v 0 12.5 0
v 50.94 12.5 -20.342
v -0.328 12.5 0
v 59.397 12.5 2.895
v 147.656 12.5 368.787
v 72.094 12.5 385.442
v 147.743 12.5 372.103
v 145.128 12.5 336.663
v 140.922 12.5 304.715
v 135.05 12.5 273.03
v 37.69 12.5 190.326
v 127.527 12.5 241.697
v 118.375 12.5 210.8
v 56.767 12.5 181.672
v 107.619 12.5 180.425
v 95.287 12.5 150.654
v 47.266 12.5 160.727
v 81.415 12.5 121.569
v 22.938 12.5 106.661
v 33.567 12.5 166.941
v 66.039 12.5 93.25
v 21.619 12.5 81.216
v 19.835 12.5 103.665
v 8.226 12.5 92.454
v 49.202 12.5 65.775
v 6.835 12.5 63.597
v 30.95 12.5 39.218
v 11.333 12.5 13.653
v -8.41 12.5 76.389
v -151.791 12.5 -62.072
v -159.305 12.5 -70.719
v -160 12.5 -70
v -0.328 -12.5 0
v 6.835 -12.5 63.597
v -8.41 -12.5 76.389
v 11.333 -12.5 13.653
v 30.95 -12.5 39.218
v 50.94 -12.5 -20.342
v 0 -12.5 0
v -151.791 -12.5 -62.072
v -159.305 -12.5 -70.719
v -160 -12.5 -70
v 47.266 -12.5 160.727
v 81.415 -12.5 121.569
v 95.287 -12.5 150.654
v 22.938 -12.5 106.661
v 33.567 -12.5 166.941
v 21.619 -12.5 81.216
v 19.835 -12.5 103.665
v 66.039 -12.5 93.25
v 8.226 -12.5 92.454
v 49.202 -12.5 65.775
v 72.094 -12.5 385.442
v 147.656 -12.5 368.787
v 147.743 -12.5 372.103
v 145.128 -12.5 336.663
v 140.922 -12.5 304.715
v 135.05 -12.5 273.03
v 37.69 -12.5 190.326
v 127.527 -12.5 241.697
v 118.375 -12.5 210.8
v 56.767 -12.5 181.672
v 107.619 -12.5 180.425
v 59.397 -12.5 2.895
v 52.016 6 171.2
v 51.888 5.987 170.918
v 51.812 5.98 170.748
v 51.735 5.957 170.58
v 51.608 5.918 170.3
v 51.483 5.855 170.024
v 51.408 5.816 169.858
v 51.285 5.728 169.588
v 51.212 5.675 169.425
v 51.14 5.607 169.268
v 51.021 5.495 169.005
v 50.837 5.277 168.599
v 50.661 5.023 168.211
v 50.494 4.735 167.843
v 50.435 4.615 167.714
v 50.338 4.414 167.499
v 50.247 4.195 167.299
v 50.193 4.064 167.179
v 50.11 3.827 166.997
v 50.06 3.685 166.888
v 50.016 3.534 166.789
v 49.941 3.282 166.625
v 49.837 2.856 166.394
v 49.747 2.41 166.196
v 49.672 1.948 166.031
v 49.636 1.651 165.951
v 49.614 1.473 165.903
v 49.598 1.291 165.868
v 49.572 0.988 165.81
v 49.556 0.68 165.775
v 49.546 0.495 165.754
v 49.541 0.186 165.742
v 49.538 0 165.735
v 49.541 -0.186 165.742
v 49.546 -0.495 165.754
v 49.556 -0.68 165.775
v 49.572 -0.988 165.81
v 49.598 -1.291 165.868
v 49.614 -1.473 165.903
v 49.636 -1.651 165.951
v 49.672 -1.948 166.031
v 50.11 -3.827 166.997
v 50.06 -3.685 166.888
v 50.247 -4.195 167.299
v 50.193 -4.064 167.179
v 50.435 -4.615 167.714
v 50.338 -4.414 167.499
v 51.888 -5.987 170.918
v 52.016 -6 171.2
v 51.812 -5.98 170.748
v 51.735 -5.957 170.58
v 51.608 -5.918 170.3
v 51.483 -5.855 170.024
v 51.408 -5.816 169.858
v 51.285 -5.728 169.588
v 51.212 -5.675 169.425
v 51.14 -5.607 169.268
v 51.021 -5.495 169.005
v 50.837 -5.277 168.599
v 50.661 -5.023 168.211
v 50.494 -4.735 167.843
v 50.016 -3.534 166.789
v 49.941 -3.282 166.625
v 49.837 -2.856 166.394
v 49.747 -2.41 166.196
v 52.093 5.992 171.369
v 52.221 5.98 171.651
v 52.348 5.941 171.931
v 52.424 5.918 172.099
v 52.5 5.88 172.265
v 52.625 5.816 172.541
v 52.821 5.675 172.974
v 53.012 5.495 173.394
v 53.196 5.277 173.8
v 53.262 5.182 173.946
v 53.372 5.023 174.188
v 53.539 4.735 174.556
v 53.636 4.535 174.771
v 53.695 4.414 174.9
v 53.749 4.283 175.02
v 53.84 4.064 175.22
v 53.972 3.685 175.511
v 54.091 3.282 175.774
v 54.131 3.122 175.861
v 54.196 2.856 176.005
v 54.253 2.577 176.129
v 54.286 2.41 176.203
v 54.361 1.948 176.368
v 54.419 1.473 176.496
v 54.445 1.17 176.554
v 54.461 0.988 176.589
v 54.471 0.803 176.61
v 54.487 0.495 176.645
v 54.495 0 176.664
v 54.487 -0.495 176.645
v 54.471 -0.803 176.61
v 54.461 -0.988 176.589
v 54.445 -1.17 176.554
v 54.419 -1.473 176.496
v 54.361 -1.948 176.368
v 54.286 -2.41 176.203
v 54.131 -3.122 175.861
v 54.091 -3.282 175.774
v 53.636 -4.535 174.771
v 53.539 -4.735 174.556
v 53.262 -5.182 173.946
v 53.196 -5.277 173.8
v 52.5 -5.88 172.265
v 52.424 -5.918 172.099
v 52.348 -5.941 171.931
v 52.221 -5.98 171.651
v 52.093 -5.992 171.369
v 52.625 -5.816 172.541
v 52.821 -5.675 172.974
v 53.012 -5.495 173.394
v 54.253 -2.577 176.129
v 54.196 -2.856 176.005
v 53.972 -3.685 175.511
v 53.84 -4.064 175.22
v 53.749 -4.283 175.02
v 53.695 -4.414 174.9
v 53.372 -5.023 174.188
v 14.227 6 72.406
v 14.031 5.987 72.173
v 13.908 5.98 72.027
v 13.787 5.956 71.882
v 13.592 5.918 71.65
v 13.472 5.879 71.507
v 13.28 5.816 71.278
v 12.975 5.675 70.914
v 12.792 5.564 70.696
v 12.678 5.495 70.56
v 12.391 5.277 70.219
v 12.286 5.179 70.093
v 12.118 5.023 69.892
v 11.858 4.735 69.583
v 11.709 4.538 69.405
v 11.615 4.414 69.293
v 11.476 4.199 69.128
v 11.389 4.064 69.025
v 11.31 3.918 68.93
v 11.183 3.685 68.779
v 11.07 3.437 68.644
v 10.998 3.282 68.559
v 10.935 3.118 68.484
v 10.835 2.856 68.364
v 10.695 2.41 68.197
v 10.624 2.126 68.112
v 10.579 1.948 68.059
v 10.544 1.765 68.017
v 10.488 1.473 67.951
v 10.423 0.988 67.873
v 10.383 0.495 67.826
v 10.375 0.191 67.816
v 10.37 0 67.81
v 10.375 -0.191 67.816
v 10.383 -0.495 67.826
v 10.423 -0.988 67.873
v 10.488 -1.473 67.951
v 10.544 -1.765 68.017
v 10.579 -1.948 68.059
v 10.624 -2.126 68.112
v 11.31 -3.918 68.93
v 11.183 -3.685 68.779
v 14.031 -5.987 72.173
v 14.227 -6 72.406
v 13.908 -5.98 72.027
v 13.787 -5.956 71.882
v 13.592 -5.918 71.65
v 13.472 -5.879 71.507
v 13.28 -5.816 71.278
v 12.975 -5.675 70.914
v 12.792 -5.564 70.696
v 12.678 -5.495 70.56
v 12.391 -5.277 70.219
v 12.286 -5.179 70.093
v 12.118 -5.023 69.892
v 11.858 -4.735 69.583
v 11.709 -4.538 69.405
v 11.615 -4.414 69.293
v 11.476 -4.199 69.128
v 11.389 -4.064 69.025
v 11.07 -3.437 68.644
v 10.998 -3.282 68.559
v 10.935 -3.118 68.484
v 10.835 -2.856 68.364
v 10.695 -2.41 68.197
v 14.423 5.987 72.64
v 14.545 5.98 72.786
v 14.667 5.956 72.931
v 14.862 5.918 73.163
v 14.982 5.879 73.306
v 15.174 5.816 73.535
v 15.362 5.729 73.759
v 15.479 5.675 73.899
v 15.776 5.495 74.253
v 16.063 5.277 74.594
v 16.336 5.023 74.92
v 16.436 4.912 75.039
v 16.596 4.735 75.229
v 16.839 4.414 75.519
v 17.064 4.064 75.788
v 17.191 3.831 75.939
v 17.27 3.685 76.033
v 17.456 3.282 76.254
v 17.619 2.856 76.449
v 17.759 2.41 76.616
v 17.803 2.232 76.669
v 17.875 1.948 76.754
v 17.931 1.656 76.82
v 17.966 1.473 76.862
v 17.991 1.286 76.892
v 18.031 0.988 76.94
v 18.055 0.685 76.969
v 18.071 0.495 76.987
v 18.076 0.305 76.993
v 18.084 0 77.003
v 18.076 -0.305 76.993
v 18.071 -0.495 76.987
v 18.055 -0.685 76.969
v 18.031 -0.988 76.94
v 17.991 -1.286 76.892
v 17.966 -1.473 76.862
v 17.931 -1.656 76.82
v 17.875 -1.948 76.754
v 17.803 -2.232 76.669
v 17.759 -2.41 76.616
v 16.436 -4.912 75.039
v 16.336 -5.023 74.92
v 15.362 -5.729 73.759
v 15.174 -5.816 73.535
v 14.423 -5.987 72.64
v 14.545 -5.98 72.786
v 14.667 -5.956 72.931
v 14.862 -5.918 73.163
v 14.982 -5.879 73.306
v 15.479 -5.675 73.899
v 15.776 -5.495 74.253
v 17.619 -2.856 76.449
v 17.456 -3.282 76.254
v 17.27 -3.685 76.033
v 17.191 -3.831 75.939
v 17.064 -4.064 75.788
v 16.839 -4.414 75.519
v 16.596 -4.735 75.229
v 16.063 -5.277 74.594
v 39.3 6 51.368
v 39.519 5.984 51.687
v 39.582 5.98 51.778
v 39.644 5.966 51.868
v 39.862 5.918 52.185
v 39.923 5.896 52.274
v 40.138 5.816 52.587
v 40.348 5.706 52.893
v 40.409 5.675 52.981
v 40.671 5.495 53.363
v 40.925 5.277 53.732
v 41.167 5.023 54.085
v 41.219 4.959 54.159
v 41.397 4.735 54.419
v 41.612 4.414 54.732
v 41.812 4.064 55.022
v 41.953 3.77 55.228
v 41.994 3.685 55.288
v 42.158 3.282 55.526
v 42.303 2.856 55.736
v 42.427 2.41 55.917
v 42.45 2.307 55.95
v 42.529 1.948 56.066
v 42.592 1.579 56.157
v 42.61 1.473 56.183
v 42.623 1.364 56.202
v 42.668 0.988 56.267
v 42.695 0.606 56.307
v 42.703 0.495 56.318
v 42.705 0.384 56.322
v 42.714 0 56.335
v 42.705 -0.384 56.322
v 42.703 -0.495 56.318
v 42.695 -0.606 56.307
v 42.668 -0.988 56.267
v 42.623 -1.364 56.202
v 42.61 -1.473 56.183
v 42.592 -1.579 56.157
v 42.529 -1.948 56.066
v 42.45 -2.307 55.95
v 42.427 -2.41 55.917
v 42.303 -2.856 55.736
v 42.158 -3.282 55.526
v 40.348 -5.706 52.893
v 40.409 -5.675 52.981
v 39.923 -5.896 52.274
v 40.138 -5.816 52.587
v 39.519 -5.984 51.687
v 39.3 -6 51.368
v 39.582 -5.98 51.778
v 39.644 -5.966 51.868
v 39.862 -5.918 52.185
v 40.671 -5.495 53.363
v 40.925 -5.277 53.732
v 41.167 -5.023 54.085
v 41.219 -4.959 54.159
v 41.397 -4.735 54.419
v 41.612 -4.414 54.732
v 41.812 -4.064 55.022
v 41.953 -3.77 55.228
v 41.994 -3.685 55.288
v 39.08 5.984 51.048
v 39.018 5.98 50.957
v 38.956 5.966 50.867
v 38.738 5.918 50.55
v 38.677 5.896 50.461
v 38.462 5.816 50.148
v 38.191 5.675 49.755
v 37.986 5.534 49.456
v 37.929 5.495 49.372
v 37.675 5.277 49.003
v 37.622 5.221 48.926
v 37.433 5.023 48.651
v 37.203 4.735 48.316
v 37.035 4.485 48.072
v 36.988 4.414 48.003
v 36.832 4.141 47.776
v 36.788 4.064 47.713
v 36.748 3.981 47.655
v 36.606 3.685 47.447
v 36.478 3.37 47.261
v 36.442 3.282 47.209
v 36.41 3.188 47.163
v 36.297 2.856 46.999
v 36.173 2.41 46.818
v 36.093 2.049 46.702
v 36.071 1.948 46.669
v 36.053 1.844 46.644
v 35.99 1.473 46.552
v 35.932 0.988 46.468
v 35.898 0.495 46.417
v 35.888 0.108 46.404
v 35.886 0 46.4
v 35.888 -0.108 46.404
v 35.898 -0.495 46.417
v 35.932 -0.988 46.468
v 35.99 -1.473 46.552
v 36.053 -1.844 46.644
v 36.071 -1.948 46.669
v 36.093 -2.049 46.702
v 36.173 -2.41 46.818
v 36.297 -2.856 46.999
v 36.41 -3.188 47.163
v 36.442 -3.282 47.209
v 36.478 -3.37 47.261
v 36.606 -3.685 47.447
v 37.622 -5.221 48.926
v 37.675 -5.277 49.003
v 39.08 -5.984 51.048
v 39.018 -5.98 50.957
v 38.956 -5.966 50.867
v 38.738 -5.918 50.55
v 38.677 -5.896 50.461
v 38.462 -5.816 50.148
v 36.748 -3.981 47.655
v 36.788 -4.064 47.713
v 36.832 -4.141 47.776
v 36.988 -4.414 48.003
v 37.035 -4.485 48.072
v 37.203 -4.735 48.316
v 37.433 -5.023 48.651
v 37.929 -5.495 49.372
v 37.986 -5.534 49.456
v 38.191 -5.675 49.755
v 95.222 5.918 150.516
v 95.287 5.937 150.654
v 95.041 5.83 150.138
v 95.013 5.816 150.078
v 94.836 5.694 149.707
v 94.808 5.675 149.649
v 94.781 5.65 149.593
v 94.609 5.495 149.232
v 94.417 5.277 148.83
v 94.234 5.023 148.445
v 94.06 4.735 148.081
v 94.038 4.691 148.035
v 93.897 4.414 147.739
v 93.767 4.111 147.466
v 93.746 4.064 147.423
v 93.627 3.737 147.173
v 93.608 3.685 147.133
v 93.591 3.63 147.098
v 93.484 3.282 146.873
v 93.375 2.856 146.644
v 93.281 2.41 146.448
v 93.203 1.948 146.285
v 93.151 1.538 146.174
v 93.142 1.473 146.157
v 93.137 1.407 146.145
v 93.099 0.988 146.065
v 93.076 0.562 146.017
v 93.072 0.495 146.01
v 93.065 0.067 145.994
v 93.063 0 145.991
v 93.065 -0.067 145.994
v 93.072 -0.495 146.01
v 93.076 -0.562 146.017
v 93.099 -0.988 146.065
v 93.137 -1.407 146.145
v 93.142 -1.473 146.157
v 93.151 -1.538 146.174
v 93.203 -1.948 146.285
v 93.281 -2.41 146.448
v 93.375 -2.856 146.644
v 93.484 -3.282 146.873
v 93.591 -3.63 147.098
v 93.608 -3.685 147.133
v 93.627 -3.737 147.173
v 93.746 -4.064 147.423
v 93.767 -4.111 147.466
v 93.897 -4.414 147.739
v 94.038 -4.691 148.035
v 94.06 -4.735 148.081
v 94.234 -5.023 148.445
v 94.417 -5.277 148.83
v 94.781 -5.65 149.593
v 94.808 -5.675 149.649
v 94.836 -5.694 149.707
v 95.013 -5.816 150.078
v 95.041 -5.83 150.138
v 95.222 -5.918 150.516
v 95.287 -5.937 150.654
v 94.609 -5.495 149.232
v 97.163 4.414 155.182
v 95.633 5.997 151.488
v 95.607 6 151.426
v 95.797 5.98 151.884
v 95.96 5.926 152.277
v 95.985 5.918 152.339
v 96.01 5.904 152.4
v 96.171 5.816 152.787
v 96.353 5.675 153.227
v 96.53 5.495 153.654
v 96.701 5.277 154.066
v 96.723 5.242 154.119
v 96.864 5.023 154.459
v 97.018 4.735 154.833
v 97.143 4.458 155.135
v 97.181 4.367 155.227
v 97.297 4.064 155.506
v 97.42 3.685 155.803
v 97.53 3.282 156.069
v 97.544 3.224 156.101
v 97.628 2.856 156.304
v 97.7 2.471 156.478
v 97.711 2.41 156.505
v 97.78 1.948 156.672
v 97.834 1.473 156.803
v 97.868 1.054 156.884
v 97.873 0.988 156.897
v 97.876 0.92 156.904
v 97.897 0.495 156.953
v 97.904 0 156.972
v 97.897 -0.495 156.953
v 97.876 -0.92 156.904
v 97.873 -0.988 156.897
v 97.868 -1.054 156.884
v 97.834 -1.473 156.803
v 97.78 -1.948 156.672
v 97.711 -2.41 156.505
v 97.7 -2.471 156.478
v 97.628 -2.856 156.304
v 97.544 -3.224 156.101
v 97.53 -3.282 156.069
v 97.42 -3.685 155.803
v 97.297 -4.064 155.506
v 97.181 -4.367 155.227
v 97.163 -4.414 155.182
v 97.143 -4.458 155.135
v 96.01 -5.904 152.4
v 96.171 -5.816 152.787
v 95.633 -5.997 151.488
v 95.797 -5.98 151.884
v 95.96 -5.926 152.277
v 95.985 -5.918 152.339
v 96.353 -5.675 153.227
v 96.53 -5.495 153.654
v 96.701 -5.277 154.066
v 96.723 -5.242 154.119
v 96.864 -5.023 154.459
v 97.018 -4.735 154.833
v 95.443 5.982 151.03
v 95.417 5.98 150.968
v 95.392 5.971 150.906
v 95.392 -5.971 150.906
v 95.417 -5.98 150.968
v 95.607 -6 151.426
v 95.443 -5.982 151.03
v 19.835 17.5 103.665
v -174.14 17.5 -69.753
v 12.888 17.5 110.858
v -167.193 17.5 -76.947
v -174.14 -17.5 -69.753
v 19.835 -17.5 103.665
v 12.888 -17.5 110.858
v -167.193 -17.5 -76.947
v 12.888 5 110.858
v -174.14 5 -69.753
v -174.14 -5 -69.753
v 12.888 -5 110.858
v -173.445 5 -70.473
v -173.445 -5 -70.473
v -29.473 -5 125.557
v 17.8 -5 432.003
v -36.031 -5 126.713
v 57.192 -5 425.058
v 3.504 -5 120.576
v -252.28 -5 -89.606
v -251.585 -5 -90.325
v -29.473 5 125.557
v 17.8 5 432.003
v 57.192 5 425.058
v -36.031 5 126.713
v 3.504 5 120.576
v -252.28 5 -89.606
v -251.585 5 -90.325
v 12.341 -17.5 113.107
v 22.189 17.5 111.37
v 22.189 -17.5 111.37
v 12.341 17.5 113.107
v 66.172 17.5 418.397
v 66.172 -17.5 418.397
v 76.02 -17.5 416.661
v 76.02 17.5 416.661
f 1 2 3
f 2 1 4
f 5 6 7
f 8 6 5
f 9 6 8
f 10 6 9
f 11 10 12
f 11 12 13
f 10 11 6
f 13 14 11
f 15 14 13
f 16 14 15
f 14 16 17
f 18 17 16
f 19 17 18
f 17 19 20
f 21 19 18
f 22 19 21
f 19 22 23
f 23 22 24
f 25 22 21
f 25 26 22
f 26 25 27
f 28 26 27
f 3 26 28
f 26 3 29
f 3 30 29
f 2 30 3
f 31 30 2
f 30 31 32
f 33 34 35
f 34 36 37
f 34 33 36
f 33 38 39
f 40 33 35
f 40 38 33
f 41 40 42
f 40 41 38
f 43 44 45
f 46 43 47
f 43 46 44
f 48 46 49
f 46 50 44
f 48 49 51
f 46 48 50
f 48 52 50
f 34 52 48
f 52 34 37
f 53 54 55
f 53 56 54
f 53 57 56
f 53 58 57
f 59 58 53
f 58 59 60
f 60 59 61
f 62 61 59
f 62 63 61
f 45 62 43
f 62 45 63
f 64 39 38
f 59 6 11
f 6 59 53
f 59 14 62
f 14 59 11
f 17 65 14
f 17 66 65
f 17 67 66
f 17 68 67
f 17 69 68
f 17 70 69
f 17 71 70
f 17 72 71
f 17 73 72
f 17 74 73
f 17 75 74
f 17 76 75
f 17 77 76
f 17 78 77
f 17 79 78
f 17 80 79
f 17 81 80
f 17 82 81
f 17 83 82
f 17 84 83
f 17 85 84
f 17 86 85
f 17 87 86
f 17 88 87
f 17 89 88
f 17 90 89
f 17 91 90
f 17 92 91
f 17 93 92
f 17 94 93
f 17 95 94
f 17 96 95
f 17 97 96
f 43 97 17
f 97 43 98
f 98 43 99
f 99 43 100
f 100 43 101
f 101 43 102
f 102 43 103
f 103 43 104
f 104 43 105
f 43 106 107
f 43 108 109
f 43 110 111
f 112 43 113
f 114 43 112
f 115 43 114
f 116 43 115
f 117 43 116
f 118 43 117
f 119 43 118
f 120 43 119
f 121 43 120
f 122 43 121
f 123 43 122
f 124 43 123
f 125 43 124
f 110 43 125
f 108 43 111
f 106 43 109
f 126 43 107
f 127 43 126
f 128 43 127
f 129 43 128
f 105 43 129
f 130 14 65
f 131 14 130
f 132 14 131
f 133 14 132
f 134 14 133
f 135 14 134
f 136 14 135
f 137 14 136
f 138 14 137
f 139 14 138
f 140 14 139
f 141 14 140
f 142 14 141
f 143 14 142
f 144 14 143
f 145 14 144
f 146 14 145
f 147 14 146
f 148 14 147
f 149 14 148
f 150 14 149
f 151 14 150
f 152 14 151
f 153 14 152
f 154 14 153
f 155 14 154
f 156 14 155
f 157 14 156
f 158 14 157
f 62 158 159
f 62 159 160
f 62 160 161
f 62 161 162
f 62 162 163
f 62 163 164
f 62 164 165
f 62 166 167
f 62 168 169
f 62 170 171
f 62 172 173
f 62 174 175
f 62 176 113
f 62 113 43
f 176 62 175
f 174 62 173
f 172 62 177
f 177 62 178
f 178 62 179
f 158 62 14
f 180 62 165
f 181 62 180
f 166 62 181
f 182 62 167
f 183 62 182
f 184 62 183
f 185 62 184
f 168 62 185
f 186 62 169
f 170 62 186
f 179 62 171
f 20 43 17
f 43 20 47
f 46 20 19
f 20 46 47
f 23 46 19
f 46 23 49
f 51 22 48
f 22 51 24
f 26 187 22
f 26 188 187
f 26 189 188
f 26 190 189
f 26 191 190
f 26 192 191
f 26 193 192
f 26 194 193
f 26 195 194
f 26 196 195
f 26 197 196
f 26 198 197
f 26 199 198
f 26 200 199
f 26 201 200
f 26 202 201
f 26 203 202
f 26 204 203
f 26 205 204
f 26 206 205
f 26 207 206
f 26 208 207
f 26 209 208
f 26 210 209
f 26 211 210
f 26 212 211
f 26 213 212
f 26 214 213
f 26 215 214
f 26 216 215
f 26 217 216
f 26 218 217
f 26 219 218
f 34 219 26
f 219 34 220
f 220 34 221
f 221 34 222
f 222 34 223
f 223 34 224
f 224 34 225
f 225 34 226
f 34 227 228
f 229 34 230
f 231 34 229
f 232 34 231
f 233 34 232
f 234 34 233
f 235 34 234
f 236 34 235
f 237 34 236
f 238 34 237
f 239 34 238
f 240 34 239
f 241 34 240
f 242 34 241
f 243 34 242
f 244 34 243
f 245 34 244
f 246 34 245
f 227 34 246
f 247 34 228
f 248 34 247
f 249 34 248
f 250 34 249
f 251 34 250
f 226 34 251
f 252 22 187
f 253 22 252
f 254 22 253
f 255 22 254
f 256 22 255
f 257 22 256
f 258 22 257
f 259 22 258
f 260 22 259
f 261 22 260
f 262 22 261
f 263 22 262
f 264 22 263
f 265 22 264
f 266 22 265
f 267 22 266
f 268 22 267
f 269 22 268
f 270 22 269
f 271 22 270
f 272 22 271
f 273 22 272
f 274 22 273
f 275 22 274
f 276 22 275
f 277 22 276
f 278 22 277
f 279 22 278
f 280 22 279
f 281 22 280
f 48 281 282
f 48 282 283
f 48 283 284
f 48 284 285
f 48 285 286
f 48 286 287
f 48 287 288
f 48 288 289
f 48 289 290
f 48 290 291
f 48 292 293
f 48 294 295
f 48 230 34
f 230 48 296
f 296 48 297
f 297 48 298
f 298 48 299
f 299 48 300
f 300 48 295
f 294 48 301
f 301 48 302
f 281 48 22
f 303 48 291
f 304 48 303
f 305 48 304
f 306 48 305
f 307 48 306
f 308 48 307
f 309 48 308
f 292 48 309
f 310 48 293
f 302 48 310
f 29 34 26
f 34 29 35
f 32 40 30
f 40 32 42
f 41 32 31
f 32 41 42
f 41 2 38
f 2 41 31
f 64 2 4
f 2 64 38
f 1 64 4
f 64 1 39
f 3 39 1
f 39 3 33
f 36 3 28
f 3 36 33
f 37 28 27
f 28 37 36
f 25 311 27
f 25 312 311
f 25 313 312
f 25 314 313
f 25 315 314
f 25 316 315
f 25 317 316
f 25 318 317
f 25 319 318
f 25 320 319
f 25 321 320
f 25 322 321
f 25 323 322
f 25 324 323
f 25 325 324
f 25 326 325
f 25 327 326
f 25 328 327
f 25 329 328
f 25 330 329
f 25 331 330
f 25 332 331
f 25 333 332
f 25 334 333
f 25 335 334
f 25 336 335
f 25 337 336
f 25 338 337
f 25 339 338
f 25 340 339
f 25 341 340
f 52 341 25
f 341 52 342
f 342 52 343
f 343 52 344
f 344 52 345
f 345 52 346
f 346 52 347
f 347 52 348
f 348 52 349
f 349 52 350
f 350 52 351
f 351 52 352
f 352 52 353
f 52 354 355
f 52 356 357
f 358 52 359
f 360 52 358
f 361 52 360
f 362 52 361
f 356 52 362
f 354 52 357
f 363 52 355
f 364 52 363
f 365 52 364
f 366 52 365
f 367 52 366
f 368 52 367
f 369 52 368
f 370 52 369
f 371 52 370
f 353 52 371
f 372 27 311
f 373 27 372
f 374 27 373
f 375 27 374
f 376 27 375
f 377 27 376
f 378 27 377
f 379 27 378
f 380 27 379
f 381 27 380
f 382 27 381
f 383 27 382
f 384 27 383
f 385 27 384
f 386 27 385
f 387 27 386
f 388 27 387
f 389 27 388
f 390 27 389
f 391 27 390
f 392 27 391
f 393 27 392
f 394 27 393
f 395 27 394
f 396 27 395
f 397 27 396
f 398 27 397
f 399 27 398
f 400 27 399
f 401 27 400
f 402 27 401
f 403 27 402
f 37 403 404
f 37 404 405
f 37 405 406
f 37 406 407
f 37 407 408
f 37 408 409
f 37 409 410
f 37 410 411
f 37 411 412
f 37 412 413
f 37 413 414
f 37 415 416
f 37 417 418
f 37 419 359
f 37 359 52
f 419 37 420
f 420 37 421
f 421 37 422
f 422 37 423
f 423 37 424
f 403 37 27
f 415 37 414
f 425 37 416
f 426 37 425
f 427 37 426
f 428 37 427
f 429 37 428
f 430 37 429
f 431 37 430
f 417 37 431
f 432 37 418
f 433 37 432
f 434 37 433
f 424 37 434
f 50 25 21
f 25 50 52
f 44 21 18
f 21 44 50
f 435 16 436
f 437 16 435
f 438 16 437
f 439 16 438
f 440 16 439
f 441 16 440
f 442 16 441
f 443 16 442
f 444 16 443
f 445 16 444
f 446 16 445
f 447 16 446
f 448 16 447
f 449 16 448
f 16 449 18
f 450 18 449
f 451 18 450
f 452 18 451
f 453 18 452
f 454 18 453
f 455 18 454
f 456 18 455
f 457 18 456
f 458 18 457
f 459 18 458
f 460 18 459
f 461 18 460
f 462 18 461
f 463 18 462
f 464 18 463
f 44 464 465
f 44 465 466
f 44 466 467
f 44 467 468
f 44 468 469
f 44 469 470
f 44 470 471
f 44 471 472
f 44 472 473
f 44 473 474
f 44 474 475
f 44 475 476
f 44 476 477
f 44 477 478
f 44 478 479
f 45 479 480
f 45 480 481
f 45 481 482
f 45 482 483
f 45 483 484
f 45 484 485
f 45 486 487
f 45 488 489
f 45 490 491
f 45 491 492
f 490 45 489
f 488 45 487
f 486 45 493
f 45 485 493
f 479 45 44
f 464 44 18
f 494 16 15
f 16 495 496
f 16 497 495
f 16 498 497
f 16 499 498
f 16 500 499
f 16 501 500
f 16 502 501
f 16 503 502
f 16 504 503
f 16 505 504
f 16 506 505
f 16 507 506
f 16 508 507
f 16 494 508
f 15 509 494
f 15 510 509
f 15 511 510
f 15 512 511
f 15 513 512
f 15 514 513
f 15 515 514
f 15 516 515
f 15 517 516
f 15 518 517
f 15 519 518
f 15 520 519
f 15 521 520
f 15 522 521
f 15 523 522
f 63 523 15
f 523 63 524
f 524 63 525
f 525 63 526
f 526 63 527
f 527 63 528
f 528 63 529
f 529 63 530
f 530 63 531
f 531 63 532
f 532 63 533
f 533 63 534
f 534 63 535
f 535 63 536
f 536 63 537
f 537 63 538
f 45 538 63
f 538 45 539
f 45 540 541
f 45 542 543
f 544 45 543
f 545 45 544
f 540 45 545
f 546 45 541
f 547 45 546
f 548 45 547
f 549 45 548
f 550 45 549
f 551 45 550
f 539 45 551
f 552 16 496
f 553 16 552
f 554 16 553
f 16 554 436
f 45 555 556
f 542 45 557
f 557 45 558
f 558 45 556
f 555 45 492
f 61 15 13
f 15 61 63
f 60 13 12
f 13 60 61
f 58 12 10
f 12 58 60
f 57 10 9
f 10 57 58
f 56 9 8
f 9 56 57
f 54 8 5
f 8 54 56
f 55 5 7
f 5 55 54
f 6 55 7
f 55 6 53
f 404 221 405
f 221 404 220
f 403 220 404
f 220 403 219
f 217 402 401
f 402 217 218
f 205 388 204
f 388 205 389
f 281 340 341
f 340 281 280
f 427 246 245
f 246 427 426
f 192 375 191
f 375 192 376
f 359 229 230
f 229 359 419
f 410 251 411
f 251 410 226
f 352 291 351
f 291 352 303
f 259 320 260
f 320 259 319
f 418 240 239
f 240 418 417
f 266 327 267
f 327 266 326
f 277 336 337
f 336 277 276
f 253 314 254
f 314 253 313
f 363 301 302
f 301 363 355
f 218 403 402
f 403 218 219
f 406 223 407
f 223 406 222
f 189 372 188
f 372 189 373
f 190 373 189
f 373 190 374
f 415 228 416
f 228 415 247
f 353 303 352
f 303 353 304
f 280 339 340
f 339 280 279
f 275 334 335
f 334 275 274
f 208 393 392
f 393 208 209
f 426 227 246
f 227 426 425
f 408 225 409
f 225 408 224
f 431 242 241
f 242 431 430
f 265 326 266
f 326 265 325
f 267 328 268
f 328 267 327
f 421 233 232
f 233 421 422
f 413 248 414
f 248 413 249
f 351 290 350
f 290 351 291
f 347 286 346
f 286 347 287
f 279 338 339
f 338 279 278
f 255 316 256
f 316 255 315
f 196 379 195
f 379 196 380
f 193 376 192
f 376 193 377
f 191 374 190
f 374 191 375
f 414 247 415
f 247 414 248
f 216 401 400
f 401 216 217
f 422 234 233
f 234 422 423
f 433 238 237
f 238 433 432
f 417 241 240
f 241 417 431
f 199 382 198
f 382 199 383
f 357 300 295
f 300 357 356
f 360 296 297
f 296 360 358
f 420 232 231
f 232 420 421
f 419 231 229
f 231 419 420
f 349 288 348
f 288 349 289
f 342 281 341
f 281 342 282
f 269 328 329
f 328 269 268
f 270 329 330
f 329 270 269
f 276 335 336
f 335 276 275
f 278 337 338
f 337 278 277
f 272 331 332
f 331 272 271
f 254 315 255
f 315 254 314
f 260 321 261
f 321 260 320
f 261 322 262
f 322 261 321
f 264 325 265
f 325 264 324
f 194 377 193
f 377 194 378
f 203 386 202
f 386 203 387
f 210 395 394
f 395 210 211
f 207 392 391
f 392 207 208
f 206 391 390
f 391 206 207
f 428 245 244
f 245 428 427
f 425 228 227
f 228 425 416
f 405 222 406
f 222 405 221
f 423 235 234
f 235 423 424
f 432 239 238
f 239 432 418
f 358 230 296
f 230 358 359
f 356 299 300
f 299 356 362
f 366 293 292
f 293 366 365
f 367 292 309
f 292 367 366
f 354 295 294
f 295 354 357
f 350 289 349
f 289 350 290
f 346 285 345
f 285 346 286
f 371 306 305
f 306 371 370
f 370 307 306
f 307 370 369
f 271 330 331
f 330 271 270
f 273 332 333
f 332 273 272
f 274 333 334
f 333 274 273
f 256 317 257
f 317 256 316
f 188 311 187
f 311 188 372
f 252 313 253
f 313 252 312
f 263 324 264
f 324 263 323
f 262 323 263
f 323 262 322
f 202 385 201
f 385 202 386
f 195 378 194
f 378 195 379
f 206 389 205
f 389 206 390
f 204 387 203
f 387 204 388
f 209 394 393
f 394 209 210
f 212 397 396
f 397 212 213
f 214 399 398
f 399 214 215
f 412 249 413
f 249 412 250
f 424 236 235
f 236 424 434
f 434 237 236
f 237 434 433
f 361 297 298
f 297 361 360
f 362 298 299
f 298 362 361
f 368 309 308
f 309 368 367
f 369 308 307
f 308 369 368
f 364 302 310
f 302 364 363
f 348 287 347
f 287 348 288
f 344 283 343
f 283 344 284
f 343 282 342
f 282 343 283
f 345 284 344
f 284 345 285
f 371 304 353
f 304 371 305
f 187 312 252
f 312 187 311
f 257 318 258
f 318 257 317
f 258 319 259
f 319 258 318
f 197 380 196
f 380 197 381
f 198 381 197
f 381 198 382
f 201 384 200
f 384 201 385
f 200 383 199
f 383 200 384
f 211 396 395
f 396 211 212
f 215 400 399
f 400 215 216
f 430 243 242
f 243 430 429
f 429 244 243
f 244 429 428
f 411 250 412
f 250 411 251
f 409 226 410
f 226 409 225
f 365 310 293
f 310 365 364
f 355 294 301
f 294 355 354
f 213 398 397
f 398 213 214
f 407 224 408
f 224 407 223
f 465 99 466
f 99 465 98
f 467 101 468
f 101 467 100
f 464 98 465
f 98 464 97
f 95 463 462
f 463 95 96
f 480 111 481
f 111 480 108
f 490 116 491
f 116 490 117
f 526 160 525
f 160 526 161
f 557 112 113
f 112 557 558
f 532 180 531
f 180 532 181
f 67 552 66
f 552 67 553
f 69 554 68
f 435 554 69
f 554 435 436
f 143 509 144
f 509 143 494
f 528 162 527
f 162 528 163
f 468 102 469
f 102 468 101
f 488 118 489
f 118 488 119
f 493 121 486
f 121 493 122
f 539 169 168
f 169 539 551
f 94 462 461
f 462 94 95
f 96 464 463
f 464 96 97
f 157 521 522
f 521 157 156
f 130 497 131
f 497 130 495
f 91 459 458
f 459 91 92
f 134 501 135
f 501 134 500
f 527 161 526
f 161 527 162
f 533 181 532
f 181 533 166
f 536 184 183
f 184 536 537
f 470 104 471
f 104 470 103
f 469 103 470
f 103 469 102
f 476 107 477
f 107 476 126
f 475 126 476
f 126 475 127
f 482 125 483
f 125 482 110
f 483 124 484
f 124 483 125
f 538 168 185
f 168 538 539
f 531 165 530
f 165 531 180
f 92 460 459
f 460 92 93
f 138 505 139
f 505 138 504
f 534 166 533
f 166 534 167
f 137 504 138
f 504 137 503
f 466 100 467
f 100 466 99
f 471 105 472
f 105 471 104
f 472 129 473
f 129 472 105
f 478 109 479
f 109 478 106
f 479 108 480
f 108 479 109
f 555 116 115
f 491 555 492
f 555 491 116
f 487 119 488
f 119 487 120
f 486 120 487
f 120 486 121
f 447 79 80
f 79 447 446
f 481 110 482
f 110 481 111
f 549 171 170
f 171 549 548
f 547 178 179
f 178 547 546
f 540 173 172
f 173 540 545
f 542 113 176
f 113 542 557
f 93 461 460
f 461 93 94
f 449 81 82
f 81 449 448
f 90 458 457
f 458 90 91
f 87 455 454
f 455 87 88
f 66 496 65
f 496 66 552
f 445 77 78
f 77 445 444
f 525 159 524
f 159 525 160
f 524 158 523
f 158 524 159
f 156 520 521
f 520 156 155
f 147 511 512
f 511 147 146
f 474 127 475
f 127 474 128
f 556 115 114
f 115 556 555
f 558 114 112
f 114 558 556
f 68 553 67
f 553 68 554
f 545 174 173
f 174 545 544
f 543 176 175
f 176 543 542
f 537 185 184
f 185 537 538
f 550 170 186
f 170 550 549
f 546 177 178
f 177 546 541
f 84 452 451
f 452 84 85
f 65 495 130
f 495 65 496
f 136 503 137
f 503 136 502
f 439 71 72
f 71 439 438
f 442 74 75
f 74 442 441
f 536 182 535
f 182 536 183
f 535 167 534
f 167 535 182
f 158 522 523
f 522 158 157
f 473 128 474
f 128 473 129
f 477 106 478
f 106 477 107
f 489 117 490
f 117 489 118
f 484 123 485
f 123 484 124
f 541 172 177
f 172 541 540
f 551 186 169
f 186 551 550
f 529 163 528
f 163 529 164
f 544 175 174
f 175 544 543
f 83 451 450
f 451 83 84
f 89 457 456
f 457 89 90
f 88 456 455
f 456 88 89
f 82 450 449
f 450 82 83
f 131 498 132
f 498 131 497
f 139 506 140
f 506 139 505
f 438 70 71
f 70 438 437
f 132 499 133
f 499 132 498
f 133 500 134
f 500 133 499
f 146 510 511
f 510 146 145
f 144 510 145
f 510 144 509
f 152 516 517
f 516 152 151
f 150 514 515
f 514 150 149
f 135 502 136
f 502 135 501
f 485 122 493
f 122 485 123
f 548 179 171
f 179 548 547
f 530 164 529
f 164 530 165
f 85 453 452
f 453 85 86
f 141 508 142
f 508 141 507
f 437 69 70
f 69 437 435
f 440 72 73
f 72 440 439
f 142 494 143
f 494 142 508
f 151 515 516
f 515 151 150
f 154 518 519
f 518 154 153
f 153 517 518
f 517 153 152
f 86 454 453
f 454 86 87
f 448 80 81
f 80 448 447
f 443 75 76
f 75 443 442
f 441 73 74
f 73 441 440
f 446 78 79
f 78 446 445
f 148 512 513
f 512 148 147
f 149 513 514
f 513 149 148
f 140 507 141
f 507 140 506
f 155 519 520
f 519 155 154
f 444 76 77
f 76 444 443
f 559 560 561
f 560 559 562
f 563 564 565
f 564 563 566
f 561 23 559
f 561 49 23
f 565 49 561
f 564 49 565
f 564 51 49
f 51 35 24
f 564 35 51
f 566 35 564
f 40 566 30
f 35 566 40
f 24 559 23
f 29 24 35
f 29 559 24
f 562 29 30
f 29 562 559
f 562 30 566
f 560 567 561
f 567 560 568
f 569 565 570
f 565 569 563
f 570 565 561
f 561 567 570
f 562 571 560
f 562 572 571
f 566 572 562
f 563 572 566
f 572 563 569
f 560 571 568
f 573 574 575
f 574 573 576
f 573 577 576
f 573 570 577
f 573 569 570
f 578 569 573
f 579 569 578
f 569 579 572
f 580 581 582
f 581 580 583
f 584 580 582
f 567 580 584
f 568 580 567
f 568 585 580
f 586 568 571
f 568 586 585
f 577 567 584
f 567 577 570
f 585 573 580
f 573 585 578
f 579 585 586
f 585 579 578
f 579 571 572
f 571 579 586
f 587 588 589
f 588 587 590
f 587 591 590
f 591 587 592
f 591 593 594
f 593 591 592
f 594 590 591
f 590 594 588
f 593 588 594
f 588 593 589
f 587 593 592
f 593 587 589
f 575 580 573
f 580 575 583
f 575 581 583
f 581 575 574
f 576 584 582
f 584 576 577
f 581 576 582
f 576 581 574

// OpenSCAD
use <libs/threads.scad>
$fs=$fs/4;
$fa=$fa/4;

pointe_l = 264;

module flexi_pointe(){
    hull(){
        rotate([0,44,0])cylinder(r=1, 264);
        translate([100,-15,20]) rotate([0,44,0])cube([5, 30, 200]);
        
        
    }
}


module flexi_pointe_sup(){
    translate([230,0,450])hull(){
        rotate([0,44+146,0])cylinder(r=1, 264);
        translate([65,-15,20]) rotate([0,44+146,0])cube([5, 30, 310]);
        
        
    }
}

module flexi_ailette(){
   translate([255,20,63]) rotate([2,-16,0]) hull(){
        cube([100,1,10]);
        translate([130, 130]) cube([100,1,10]);
        
        
        
    }
}

module dent2d(){
    polygon([[0,0.3], [10,-07], [20,-15], [30,-24], [40,-32]
                , [50,-40], [60,-49], [70,-55], [80,-62], [90,-69]
                , [100,-76], [120,-89], [140,-99], [160,-108], [180,-116]
                , [200,-125], [240,-139], [280,-150], [320,-158], [360,-164]
                , [400,-166], [440,-166], [480,-165], [520,-164],
                , [520,-220], [480,-221], [440,-222], [400,-223],
                , [360,-222], [320,-217], [280,-212], [240,-201],
                , [200,-187], [180,-180], [160,-173], [140,-165], [120,-156]
                , [100,-146], [90,-141],[80,-135], [70,-130], [60,-123]
                , [50,-117], [40,-110], [30,-104], [20,-96], [10,-89]
                , [00,-80]]);
}

module dent2d2(){
    rotate([0,0,-90])difference(){
        translate([-467, 0]) intersection(){
            square([800,401.4]);
            translate([0,401])circle(615.5+60);
        }
        translate([-467, 0]) translate([0,401])circle(615.5);
        rotate([0,0,2.79]) translate([0,-200,0])square(200);
    }
}

module dent3d(){
    e = 25;
    rotate([0,-90, 90]) rotate([0,0,2.8])difference(){
        translate([0,0,-e/2])
            linear_extrude(25){
                dent2d();

        }
    }
}

module dent_trio(){
    e = 25;
    rotate([0,-90, 90]) rotate([0,0,2.8])difference(){
        translate([0,0,-e/2])
            linear_extrude(25){
                dent2d();

        }
        translate([60,-88, -1-e/2]) cylinder(r=13/2, 30);
        hull(){
            translate([10,-90])sphere(13/2);
            translate([52,-40])sphere(13/2);
        }
        hull(){
            translate([145,-100])sphere(13/2);
            translate([112,-160])sphere(13/2);
        }
    }
}

a1 = 44;
a2 = 146;

module pointe2d(){
    difference(){
        union(){
            hull(){
                translate([-70,160,0]) rotate([0,0,180+a1])square([1, 260]);       
                translate([-20,-50,0]) rotate([0,0,180+90-20]) square([1, 100]);
            }
            translate([90,-20]) rotate([00,0,90-(a1+a2)])square([90,300]);
            
        }
        
        translate([96,-4]) rotate([0,0,180-40])square([23,23]);
        translate([192,-34]) rotate([0,0,180-24.4])square([23,25]);
        
        dent2d2();
    }
}

module pointe3d(){
    e = 25;
    difference(){
        translate([0,0,-e/2])
            linear_extrude(25){
                pointe2d();
            }
        translate([96,-4]) rotate([90,0,180-40]) translate([11.5,0,0]) cylinder(r=6,200, center = true);
        translate([192,-34]) rotate([90,0,180-24.4])translate([11.5,0,0]) cylinder(r=6,200, center = true);
    }
}



mode = 2;


e2 = 35; //largeur
e3 = 40;

module pointe3(){
    hull(){
        translate([0,0,-70]) cube([1, 10, 330]);
        translate([e3,0,0])cube([1, 10, 260]);
    }
}



if(mode==0){
    flexi_pointe();

    flexi_pointe_sup();
    flexi_ailette();
    mirror([0,1])flexi_ailette();
    
    
} else if(mode==1){
    translate([-210,0,-60]) union(){
        flexi_pointe();
        flexi_pointe_sup();
        flexi_ailette();
        mirror([0,1])flexi_ailette();
        
    }
    color("blue")dent_trio();
} else if(mode==2){
    %color("gray")dent_trio();
    
    rotate([0,-90, 90]) pointe3d();
    e = 24;
    color("green") translate([-160,-e2/2,-70]) rotate([0,90-a1]) translate([-10,0,-10]) cube([10, e2, 260]);
    
    color("blue")translate([-160,-5,-70]) rotate([0,90-a1]) translate([-e3-10,0,-10])pointe3();
    
    translate([-210,0,-60])translate([230,0,450])translate([65,0,20]) rotate([0,44+146,0])
         color("green") translate([10, -e2/2, -5])cube([10,e2, 310]);
    
    translate([-210,0,-60])translate([230,0,450])translate([65,0,20]) rotate([0,44+146,0])
         color("blue") translate([e3-10, -5, -10])cube([e3, 10, 310]);
    
} else {
    pointe2d();
}
